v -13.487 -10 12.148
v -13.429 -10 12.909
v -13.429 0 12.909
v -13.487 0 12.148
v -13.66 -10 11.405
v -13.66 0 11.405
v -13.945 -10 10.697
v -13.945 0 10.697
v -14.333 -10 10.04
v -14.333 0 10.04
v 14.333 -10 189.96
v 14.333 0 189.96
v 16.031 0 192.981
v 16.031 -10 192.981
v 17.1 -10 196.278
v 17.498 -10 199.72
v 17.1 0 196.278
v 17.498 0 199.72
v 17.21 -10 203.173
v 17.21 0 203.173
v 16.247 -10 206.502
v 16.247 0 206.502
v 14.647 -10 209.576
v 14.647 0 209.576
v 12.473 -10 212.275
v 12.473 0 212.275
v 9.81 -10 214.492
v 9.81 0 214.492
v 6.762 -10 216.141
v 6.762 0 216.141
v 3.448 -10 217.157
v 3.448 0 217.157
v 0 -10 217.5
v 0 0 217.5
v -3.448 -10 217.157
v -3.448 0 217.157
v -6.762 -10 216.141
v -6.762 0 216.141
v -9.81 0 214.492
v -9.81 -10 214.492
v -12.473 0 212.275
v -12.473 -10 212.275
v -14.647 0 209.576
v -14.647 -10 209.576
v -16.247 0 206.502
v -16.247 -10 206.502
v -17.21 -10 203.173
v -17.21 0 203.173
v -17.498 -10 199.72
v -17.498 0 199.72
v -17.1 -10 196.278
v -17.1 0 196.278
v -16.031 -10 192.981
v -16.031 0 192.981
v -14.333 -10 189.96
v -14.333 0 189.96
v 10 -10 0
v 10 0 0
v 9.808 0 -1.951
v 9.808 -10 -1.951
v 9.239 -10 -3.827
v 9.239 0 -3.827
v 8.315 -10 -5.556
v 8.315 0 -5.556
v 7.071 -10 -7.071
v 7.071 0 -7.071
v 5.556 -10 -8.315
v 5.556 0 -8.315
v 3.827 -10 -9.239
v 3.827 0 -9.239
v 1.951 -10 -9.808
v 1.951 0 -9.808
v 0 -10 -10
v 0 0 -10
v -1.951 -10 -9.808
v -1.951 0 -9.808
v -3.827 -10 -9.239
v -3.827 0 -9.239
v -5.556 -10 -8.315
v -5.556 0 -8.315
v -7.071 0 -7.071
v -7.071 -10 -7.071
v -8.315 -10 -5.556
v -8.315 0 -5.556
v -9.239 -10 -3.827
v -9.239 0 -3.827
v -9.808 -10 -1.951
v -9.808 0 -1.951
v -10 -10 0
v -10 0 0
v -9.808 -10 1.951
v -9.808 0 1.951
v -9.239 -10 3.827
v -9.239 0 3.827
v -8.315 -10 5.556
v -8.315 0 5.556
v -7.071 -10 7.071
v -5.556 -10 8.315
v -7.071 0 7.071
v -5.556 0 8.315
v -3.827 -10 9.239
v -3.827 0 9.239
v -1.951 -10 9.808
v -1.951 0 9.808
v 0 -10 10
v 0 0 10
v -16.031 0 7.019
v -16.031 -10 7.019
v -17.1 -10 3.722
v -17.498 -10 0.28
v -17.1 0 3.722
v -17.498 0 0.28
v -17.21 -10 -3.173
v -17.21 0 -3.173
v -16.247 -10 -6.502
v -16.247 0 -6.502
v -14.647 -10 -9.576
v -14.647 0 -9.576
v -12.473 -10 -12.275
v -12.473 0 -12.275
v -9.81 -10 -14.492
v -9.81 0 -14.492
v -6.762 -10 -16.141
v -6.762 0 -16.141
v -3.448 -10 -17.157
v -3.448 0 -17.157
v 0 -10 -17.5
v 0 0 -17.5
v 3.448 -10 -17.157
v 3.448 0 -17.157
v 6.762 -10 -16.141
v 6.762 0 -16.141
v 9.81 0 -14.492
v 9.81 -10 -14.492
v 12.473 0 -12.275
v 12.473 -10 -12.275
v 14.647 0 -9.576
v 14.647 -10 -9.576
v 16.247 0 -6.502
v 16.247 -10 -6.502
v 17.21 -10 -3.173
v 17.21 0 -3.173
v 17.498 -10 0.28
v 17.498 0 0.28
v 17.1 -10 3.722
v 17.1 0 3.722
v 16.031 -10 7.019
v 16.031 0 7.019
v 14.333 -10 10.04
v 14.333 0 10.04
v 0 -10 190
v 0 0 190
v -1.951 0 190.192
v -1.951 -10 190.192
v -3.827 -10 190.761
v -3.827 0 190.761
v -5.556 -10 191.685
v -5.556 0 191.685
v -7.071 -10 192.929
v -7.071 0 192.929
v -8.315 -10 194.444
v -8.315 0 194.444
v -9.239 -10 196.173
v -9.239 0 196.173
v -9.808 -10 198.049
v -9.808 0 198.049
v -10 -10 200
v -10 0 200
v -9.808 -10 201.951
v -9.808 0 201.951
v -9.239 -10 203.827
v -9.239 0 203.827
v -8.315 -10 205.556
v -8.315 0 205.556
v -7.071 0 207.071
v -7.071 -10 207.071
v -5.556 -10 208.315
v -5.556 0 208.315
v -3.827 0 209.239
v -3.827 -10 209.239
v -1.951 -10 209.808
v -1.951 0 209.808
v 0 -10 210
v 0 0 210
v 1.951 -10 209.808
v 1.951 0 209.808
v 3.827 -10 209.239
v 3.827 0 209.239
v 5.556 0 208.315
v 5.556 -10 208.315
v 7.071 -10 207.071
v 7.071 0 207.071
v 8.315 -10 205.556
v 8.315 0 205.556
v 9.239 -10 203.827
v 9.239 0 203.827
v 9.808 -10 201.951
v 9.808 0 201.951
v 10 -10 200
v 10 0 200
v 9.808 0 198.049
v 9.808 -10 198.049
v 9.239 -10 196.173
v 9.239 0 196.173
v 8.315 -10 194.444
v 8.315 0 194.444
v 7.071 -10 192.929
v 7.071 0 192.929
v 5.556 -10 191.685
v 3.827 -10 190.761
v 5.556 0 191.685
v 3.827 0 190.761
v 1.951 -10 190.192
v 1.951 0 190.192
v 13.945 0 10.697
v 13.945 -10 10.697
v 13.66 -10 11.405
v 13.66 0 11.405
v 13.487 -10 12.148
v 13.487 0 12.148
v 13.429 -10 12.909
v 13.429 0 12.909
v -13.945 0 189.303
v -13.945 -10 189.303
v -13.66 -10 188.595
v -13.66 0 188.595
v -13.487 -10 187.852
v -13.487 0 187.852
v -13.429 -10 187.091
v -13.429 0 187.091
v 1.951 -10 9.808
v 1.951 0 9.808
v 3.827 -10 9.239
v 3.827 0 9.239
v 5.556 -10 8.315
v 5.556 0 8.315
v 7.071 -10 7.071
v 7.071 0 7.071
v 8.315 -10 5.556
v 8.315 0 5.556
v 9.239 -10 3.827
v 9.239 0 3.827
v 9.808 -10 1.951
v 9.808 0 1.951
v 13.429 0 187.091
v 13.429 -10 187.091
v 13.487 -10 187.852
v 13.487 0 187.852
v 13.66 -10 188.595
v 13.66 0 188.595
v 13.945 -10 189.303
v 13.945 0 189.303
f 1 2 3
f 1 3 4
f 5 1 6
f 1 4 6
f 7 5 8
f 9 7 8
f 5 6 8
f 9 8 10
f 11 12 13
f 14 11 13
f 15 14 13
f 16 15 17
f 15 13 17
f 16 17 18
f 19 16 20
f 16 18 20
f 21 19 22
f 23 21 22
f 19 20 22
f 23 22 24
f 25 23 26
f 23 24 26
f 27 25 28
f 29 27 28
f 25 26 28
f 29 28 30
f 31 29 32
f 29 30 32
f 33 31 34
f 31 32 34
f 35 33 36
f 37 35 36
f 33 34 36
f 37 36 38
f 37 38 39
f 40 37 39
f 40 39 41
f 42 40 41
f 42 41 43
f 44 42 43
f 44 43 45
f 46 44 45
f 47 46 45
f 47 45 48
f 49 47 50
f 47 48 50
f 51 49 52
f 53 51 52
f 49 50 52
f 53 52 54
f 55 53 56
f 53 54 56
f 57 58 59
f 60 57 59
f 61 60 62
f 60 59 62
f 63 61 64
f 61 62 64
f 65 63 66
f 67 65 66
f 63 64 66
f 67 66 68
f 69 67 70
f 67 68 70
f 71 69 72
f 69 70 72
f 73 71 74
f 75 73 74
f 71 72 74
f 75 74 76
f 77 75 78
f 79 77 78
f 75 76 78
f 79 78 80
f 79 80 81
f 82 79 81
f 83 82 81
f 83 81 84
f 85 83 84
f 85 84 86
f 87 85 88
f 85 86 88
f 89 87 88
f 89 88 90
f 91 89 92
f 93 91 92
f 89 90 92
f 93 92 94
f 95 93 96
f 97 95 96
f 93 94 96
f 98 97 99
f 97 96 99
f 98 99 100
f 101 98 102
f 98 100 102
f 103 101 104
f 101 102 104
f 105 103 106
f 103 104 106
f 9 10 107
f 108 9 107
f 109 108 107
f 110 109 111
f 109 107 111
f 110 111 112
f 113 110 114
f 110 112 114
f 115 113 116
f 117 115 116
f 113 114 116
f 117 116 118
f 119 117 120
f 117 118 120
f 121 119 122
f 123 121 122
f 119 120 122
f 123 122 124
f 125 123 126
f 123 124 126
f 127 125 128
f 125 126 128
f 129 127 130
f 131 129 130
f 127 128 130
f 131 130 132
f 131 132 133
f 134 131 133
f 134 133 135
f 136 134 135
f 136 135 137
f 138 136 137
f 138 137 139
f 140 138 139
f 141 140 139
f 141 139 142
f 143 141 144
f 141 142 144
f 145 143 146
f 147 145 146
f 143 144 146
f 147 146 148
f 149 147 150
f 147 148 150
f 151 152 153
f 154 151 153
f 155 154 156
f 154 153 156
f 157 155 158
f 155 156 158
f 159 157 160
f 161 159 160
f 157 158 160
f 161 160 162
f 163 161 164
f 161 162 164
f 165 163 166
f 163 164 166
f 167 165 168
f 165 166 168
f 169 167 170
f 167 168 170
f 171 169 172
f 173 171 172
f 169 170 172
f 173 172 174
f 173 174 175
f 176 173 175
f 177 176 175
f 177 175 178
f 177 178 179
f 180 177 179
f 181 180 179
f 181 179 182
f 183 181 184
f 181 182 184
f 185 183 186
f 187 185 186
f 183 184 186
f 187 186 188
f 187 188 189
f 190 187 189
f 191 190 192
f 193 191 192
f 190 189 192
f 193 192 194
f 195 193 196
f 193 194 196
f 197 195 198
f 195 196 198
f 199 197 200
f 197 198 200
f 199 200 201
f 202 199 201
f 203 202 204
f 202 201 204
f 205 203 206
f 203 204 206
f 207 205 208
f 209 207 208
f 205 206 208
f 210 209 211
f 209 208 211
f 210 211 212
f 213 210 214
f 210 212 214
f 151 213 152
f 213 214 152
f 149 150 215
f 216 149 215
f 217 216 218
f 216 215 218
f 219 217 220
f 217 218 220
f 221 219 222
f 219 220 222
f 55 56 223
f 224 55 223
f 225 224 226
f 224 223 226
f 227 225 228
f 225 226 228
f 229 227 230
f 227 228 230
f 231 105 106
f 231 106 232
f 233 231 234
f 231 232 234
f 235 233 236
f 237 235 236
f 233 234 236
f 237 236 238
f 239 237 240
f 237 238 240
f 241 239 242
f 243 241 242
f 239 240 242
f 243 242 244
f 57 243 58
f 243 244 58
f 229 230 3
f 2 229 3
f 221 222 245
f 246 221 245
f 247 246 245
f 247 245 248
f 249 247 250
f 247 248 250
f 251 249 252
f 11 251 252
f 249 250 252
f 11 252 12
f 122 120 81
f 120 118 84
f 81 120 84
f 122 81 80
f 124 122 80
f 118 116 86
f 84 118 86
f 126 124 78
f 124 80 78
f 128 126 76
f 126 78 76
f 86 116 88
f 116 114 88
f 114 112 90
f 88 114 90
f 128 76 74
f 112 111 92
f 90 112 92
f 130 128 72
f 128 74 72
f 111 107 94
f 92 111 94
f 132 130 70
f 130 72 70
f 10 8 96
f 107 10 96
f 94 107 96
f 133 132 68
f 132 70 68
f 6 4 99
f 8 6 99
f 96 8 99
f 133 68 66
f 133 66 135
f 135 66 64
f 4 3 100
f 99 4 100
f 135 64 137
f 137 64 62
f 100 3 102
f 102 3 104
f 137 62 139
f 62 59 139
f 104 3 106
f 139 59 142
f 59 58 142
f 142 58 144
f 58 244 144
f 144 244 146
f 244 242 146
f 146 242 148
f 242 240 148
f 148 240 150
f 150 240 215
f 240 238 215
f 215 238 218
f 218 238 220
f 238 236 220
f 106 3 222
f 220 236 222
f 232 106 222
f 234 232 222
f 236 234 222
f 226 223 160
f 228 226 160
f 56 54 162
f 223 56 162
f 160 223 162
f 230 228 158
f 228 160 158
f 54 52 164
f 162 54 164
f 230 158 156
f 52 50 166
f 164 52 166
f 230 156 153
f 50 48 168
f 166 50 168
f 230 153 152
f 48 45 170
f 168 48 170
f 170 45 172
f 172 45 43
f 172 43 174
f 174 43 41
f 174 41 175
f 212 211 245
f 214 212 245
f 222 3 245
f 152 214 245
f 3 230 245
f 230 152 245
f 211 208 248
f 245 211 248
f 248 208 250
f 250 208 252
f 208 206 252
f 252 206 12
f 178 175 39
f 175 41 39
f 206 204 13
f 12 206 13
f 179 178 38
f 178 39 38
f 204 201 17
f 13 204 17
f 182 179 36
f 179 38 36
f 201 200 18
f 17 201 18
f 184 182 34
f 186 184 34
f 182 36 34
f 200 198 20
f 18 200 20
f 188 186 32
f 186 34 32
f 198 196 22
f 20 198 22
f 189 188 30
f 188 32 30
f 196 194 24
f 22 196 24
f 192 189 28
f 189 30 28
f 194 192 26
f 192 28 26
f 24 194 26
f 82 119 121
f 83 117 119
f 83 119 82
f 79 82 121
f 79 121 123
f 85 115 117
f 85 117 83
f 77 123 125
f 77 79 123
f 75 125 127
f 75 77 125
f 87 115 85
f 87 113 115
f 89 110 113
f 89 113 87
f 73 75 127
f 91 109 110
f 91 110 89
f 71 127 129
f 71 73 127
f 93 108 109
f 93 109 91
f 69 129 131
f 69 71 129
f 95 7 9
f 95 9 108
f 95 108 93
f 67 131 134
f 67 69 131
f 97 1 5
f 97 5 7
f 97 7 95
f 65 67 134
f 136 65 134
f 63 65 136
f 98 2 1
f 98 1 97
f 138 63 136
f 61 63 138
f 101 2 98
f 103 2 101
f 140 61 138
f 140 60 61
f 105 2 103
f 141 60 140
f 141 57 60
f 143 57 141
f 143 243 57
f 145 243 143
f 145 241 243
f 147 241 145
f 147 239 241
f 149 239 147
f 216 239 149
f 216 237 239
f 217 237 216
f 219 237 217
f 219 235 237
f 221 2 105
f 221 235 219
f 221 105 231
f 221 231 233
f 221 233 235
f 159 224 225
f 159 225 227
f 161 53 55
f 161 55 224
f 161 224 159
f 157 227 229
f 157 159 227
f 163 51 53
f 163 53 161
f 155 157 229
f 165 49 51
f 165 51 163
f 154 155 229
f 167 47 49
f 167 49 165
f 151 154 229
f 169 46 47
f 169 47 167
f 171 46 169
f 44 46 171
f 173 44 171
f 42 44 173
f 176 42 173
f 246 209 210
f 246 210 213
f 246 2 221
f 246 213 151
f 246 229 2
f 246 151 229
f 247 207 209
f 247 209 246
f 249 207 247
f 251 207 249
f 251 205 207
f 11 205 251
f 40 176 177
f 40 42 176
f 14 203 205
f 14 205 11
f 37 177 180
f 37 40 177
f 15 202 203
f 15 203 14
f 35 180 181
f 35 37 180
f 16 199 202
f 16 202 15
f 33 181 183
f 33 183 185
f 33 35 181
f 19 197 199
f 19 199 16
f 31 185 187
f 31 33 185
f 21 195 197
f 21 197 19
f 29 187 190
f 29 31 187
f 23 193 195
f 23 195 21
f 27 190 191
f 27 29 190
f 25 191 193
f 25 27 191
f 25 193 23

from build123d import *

# Parameters (mm, degrees)
F1_DEPTH = 10


with BuildPart() as f1:
    # F0 (on Front) → F1 (new body)
    with BuildSketch(Plane.XZ):
        with BuildLine():
            ThreePointArc((13.428571, 187.091175), (13.660124, 188.595138), (14.333333, 189.959803))
            ThreePointArc((14.333333, 189.959803), (0, 217.5), (-14.333333, 189.959803))
            ThreePointArc((-14.333333, 189.959803), (-13.660124, 188.595138), (-13.428571, 187.091175))
            Line((-13.428571, 187.091175), (-13.428571, 12.908825))
            ThreePointArc((-13.428571, 12.908825), (-13.660124, 11.404862), (-14.333333, 10.040197))
            ThreePointArc((-14.333333, 10.040197), (0, -17.5), (14.333333, 10.040197))
            ThreePointArc((14.333333, 10.040197), (13.660124, 11.404862), (13.428571, 12.908825))
            Line((13.428571, 12.908825), (13.428571, 187.091175))
        make_face()
        with BuildLine():
            ThreePointArc((0, 10), (7.071068, 7.071068), (10, 0))
            ThreePointArc((10, 0), (-7.071068, -7.071068), (0, 10))
        make_face(mode=Mode.SUBTRACT)
        with BuildLine():
            ThreePointArc((10, 200), (7.071068, 192.928932), (0, 190))
            ThreePointArc((0, 190), (-7.071068, 207.071068), (10, 200))
        make_face(mode=Mode.SUBTRACT)
    extrude(amount=F1_DEPTH)


solid = f1.part
